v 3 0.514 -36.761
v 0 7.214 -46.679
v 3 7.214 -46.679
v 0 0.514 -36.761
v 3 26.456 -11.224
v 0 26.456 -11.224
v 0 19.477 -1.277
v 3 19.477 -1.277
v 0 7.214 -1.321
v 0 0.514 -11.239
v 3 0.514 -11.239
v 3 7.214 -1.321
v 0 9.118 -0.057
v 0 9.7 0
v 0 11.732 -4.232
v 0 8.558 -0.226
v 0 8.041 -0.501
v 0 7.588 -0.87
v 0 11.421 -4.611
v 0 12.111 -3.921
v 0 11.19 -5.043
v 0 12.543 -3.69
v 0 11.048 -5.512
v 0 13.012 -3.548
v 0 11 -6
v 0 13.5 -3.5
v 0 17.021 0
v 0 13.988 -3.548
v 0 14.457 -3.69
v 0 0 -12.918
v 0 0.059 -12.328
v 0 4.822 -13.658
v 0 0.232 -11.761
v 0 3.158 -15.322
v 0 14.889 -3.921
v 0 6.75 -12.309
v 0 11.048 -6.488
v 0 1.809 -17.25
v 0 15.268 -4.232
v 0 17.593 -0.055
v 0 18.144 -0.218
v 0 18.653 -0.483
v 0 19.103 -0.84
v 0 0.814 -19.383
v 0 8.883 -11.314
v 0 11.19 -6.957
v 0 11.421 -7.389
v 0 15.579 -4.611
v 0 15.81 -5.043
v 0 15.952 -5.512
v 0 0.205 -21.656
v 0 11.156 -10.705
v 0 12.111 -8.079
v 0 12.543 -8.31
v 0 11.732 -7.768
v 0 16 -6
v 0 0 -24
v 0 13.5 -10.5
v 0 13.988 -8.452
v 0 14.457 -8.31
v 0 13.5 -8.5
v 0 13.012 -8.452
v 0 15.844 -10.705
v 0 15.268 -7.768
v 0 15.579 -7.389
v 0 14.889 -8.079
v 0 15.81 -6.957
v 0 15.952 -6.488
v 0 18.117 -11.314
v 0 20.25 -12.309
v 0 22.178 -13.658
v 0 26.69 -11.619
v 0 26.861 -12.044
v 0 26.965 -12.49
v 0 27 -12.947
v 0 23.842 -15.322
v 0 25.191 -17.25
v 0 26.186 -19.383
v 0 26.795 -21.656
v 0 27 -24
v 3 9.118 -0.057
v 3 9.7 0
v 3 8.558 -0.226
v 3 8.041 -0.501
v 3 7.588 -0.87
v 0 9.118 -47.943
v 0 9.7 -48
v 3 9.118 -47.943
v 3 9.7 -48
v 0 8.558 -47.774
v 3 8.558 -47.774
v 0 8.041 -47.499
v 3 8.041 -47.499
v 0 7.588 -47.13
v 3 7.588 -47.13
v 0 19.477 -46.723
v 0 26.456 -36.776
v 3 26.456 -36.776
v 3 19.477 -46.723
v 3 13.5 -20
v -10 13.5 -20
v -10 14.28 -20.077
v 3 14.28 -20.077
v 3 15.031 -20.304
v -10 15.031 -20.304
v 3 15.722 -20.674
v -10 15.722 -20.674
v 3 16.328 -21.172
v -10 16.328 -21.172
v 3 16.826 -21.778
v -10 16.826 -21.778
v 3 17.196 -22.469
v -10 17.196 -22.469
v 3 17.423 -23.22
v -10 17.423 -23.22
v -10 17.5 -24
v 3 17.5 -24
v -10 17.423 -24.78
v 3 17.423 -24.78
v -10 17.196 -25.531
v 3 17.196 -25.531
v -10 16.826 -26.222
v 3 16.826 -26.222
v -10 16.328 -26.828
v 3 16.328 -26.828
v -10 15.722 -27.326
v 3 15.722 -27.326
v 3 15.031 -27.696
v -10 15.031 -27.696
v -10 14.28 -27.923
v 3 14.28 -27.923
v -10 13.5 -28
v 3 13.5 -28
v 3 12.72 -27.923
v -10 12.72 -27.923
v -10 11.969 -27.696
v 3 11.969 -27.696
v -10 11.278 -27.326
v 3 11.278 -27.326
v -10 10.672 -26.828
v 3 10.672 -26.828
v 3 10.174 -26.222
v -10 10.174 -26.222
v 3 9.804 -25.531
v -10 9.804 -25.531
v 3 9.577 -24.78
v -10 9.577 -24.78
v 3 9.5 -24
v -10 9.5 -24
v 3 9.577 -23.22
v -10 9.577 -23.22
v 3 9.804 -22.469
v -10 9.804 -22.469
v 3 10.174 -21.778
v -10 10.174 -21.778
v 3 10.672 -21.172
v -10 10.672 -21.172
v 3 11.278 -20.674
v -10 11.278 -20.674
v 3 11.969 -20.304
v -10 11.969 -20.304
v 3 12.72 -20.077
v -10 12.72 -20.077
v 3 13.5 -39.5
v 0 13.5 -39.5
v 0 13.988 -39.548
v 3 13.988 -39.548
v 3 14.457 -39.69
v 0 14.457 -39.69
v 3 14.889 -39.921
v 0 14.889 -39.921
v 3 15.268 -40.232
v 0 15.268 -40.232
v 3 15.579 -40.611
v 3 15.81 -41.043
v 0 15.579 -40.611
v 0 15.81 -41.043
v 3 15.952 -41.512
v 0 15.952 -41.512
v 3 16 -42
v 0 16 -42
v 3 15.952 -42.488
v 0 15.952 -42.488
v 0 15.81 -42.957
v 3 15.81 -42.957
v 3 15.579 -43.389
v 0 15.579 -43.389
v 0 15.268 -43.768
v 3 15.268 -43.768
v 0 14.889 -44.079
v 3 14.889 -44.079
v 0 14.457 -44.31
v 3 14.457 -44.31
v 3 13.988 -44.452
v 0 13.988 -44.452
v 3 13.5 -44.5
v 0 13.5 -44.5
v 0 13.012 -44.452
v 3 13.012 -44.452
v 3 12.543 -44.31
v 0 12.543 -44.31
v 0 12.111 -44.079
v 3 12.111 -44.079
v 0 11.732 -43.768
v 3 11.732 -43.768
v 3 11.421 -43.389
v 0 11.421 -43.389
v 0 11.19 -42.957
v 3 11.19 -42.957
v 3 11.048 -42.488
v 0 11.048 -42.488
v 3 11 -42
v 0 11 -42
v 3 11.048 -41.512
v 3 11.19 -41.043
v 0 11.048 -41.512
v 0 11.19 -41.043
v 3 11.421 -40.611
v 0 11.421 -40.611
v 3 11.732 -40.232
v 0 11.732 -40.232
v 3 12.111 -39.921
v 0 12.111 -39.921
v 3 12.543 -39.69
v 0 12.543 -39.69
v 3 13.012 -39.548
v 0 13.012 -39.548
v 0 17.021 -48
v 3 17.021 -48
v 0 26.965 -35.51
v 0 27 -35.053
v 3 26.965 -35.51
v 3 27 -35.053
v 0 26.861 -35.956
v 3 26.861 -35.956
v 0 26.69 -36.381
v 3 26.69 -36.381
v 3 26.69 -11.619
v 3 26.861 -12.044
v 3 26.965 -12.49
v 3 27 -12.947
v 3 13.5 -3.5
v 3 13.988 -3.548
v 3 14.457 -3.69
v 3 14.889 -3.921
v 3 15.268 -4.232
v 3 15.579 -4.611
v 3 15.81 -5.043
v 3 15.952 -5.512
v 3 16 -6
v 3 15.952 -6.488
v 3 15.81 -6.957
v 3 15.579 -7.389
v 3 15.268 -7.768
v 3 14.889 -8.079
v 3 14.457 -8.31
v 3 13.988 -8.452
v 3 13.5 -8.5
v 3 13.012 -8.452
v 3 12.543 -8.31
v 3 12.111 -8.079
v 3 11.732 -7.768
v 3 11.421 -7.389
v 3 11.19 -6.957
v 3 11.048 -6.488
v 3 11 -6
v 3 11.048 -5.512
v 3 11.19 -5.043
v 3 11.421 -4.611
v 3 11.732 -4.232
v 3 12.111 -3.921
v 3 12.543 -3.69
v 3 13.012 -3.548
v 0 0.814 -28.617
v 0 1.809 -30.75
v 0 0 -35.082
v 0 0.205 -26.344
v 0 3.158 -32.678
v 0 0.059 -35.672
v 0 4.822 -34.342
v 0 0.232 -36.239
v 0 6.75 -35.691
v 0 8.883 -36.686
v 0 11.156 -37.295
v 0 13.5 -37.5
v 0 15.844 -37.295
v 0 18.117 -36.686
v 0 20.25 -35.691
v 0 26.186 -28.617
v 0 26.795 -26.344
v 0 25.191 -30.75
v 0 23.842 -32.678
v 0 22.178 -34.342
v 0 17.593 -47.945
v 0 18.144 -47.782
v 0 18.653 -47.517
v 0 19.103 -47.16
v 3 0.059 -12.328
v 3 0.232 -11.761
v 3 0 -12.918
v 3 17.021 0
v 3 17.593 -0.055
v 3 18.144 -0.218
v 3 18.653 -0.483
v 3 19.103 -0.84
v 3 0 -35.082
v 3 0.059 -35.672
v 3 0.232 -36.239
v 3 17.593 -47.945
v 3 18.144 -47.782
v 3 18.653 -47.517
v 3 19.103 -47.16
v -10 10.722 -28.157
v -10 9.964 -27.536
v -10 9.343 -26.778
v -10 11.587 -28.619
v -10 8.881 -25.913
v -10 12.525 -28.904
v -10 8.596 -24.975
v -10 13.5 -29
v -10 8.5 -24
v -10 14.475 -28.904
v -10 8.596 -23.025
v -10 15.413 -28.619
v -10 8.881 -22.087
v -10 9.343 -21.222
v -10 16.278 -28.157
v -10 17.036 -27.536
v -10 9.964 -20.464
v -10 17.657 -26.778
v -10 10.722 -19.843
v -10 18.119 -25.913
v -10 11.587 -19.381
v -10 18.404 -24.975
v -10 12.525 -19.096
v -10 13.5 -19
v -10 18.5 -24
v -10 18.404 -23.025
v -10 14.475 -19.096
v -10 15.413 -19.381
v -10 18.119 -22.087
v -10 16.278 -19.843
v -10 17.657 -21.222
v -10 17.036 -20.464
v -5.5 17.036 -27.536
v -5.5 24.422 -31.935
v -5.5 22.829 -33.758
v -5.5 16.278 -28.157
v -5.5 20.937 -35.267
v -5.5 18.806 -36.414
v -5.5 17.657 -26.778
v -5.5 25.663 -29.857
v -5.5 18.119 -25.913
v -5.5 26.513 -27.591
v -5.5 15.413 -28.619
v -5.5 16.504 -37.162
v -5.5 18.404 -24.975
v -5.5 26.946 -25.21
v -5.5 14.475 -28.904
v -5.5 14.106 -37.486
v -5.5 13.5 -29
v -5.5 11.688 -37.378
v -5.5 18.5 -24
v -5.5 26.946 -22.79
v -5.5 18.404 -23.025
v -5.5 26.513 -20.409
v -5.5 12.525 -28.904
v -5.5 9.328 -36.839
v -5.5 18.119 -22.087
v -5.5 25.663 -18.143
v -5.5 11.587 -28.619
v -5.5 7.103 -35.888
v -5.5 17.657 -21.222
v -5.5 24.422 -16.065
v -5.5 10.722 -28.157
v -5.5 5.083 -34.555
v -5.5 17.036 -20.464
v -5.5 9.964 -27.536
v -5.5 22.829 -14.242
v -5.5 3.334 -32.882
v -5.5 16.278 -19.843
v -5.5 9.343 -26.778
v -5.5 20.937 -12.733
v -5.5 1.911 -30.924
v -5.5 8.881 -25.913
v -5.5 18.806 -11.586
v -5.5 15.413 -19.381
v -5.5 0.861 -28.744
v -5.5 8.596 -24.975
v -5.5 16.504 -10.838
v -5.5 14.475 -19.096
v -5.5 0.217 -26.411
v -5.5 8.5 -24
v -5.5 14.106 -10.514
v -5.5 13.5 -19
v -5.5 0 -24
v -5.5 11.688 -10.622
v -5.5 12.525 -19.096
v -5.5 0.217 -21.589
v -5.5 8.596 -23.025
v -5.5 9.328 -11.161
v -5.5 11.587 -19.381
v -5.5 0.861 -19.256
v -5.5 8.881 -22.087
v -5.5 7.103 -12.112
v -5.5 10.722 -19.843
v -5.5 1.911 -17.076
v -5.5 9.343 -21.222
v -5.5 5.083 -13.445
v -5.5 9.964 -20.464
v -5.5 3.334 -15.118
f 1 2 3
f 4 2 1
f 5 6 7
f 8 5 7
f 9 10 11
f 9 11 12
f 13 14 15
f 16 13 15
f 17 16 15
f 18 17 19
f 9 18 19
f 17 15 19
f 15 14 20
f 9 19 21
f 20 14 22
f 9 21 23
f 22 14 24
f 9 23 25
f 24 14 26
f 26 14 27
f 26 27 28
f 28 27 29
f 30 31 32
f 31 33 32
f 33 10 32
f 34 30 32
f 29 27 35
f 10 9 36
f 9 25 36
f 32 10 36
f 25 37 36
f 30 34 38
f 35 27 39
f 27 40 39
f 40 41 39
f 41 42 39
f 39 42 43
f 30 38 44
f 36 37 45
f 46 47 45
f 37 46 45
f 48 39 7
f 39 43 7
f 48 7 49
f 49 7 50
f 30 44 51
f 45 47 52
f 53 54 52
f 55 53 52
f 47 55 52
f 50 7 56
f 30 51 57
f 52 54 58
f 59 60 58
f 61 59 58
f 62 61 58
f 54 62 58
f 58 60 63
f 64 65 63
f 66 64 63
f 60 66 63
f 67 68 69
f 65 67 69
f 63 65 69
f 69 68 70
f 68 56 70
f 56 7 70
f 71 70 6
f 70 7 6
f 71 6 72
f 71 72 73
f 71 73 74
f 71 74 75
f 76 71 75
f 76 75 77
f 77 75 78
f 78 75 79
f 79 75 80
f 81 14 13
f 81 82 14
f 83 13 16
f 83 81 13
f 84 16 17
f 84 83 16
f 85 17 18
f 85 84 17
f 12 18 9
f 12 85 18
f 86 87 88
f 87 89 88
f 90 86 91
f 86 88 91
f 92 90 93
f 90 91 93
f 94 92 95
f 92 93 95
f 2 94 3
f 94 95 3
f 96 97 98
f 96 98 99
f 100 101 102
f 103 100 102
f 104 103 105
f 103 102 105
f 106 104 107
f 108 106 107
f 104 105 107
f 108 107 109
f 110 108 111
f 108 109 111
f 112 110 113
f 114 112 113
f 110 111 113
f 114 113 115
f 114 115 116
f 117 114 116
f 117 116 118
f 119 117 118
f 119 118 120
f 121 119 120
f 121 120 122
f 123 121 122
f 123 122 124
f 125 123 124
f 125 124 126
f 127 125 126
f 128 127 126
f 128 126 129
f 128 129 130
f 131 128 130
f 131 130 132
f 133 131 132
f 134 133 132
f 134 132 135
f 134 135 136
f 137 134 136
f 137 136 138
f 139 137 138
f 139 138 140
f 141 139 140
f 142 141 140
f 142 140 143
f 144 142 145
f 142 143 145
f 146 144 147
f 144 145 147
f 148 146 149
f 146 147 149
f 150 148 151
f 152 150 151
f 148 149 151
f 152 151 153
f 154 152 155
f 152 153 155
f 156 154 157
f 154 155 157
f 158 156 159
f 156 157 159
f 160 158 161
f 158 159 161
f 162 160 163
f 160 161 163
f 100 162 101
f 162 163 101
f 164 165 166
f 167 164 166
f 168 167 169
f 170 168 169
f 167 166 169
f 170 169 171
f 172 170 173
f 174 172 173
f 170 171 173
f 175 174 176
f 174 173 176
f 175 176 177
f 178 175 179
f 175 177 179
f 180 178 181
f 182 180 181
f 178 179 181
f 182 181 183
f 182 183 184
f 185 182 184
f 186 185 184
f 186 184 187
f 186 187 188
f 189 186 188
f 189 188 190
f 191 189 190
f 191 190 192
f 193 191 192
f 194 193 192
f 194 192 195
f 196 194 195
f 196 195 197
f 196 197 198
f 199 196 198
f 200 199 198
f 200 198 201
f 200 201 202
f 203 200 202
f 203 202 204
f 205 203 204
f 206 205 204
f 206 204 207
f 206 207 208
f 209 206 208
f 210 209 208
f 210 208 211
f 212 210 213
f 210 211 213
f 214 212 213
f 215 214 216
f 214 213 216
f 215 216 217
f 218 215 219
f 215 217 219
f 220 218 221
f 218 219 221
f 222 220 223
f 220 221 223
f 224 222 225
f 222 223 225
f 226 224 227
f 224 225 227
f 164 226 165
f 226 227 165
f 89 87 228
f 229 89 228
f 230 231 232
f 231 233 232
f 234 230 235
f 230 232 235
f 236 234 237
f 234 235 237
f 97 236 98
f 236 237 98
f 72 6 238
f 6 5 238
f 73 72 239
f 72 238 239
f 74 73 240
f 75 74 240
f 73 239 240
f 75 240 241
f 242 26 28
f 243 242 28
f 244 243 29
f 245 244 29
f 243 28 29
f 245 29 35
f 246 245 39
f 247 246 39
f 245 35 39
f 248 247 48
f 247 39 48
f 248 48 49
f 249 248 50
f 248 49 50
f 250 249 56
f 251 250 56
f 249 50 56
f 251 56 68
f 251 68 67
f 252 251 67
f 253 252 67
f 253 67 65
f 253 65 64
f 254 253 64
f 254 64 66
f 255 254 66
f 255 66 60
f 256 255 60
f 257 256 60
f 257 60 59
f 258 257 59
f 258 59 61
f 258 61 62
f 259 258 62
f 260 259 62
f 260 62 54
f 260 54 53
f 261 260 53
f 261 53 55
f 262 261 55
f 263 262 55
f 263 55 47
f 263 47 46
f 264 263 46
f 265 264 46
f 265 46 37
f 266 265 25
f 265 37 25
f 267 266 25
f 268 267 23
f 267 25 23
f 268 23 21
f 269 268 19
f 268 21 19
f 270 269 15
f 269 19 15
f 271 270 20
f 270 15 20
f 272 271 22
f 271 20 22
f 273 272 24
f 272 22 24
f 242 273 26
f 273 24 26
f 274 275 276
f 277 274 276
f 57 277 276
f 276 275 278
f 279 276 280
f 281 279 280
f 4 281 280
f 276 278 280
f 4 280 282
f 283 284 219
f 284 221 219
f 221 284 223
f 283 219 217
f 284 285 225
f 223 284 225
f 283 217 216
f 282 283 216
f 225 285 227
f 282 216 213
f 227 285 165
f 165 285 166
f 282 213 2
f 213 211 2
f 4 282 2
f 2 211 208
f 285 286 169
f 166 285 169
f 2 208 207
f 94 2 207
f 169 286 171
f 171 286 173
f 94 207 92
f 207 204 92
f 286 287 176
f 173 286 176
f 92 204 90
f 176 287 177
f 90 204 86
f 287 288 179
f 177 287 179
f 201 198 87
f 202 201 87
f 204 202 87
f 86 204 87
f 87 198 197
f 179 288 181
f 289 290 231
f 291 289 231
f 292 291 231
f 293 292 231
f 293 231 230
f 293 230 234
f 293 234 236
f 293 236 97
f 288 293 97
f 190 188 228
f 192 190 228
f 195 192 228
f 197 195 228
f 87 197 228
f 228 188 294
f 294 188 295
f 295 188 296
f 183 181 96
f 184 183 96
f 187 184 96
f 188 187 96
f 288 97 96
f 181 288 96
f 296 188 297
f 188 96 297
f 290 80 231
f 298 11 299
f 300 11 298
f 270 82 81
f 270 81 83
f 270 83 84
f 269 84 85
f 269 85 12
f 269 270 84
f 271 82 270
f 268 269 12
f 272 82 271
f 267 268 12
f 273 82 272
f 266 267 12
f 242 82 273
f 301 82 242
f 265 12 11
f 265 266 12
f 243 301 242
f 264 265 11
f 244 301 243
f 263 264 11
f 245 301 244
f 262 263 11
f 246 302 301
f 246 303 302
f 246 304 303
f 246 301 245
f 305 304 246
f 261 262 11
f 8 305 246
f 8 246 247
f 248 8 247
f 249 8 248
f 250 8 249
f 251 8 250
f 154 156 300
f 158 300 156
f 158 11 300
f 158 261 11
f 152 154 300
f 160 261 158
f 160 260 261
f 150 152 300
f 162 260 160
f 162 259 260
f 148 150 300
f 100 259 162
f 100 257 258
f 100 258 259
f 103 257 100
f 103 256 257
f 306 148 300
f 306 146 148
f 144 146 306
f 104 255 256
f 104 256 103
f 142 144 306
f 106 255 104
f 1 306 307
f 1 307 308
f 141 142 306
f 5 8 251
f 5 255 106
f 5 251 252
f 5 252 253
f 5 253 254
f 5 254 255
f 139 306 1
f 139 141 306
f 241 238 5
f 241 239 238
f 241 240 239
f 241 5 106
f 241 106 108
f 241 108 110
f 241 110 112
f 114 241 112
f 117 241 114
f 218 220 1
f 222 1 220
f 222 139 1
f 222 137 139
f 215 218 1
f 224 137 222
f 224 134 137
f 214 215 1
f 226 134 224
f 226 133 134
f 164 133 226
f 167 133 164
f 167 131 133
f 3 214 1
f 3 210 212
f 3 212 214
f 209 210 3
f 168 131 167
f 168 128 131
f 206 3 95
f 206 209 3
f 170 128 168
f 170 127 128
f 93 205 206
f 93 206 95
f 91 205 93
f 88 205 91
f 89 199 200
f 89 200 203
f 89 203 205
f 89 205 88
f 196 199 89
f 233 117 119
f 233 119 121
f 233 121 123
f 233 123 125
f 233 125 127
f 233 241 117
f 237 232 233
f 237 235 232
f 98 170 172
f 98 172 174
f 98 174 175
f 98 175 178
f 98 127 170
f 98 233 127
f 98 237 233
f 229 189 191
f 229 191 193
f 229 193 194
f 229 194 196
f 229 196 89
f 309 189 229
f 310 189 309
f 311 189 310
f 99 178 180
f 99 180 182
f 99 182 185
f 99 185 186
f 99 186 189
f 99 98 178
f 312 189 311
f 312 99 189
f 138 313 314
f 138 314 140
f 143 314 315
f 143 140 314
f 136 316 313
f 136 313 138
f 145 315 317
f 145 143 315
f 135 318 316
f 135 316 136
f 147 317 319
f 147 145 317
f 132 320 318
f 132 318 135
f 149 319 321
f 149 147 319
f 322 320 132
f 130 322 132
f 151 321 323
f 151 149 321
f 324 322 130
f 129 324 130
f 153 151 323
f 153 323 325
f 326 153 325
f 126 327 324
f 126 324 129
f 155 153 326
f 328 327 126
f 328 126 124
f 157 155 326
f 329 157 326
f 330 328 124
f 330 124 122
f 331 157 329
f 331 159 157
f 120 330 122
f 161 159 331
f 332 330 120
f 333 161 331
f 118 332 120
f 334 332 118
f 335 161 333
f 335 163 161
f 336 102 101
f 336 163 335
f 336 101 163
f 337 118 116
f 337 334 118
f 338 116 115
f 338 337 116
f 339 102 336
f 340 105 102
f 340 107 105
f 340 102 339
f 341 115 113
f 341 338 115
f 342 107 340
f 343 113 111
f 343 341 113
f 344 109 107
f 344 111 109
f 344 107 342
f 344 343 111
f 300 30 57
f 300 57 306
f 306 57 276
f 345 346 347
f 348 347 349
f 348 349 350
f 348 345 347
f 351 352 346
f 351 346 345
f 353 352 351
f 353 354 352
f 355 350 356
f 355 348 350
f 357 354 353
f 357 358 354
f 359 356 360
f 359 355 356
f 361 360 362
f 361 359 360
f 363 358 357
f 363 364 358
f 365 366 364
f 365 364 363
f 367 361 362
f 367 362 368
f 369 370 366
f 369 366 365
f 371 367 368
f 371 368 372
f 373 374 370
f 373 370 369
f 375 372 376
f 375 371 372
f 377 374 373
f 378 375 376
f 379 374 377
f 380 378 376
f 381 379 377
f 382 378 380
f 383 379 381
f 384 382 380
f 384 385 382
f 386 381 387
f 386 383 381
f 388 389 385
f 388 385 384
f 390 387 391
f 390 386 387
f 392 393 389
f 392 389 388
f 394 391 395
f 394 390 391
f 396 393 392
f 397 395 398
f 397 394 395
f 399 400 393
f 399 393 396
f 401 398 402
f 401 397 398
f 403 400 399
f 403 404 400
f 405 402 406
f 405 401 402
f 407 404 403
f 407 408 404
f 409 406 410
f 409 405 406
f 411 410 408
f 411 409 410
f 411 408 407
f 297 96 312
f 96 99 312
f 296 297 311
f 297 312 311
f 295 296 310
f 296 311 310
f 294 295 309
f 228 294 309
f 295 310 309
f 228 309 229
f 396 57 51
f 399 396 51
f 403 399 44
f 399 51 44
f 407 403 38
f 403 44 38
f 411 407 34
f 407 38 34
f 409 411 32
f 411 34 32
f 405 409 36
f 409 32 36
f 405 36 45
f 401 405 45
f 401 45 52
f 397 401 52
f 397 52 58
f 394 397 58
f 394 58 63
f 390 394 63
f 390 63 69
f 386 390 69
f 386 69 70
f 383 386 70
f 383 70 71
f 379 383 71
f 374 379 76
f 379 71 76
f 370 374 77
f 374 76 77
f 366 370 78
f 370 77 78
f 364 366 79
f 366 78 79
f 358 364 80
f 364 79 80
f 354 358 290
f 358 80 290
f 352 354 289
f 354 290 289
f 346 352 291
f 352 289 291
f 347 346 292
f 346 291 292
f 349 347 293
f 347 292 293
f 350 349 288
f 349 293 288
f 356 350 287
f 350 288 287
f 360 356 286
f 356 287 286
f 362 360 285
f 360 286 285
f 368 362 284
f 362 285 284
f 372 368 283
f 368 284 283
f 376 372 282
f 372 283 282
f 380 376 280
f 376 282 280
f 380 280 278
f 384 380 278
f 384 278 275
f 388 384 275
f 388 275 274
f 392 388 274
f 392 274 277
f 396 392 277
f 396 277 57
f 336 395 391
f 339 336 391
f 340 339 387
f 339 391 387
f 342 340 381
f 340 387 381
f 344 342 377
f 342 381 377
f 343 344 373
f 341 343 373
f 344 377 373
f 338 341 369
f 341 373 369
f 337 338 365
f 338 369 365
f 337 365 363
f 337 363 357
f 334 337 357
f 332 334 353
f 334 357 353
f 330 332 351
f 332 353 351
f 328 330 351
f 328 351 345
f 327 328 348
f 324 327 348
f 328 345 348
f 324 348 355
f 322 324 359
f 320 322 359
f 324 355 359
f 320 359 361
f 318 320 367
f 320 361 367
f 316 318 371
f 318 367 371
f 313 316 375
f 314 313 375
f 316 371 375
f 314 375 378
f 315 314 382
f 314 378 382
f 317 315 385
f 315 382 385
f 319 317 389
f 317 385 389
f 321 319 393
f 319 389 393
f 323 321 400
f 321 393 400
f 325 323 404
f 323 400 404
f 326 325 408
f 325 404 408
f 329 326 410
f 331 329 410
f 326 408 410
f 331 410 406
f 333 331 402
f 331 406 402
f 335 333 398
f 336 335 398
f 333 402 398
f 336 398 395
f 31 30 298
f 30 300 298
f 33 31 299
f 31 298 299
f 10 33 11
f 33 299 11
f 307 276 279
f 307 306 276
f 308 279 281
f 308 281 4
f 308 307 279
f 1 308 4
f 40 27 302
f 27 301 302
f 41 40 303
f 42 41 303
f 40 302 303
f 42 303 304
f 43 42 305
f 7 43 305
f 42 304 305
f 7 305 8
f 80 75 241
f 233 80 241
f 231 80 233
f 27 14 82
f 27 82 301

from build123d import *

# Parameters (mm, degrees)
SKETCH_1_W          = 48
SKETCH_1_H          = 27
EXTRUDE_1_DEPTH     = 3
SKETCH_5_R          = 13.5
EXTRUDE_2_DEPTH     = 5.5
SKETCH_6_R          = 5
EXTRUDE_3_DEPTH     = 4.5
SKETCH_7_R          = 4
CUT_EXTRUDE_1_DEPTH = 57.586217403
SKETCH_8_R          = 2.5
CUT_EXTRUDE_2_DEPTH = 56.973207877
CUT_EXTRUDE_3_DEPTH = 56.973207877
FILLET_1_R          = 3


with BuildPart() as part:
    # 草图1 → 凸台-拉伸1 (new body)
    with BuildSketch(Plane(origin=(0, 0, 0), x_dir=(0, 0, -1), z_dir=(1, 0, 0))):
        with Locations((24, 13.5)):
            Rectangle(SKETCH_1_W, SKETCH_1_H)
    extrude(amount=EXTRUDE_1_DEPTH)

    # 草图5 → 凸台-拉伸2 (add)
    with BuildSketch(Plane.ZY):
        with Locations(Location((-24, 13.5, 0), (0, 0, 270))):
            Circle(SKETCH_5_R)
    extrude(amount=EXTRUDE_2_DEPTH)

    # 草图6 → 凸台-拉伸3 (add)
    with BuildSketch(Plane.ZY.offset(5.5)):
        with Locations((-24, 13.5)):
            Circle(SKETCH_6_R)
    extrude(amount=EXTRUDE_3_DEPTH)

    # 草图7 → 切除-拉伸1 (cut, through all)
    with BuildSketch(Plane.ZY.offset(10)):
        with Locations((-24, 13.5)):
            Circle(SKETCH_7_R)
    extrude(amount=-CUT_EXTRUDE_1_DEPTH, mode=Mode.SUBTRACT)

    # 草图8 → 切除-拉伸2 (cut, through all)
    with BuildSketch(Plane.ZY):
        with Locations((-42, 13.5)):
            Circle(SKETCH_8_R)
        with Locations((-6, 13.5)):
            Circle(SKETCH_8_R)
    extrude(amount=-CUT_EXTRUDE_2_DEPTH, mode=Mode.SUBTRACT)

    # 草图9 → 切除-拉伸3 (cut, through all)
    with BuildSketch(Plane.ZY):
        Polygon((-36, 27), (-48, 18.580800232), (-48, 27), align=None)
        Polygon((-12, 27), (0, 18.580800232), (0, 27), align=None)
        Polygon((0, 0), (-12, 0), (0, 8.106535138), align=None)
        Polygon((-48, 0), (-48, 8.106535138), (-36, 0), align=None)
    extrude(amount=-CUT_EXTRUDE_3_DEPTH, mode=Mode.SUBTRACT)

    # 圆角1
    fillet_1_edges = [part.edges().sort_by_distance(p)[0] for p in [
        (1.5, 27, -36),
        (1.5, 18.580800232, -48),
        (1.5, 27, -12),
        (1.5, 18.580800232, 0),
        (1.5, 8.106535138, 0),
        (1.5, 0, -12),
        (1.5, 0, -36),
        (1.5, 8.106535138, -48),
    ]]
    fillet(fillet_1_edges, radius=FILLET_1_R)


solid = part.part
